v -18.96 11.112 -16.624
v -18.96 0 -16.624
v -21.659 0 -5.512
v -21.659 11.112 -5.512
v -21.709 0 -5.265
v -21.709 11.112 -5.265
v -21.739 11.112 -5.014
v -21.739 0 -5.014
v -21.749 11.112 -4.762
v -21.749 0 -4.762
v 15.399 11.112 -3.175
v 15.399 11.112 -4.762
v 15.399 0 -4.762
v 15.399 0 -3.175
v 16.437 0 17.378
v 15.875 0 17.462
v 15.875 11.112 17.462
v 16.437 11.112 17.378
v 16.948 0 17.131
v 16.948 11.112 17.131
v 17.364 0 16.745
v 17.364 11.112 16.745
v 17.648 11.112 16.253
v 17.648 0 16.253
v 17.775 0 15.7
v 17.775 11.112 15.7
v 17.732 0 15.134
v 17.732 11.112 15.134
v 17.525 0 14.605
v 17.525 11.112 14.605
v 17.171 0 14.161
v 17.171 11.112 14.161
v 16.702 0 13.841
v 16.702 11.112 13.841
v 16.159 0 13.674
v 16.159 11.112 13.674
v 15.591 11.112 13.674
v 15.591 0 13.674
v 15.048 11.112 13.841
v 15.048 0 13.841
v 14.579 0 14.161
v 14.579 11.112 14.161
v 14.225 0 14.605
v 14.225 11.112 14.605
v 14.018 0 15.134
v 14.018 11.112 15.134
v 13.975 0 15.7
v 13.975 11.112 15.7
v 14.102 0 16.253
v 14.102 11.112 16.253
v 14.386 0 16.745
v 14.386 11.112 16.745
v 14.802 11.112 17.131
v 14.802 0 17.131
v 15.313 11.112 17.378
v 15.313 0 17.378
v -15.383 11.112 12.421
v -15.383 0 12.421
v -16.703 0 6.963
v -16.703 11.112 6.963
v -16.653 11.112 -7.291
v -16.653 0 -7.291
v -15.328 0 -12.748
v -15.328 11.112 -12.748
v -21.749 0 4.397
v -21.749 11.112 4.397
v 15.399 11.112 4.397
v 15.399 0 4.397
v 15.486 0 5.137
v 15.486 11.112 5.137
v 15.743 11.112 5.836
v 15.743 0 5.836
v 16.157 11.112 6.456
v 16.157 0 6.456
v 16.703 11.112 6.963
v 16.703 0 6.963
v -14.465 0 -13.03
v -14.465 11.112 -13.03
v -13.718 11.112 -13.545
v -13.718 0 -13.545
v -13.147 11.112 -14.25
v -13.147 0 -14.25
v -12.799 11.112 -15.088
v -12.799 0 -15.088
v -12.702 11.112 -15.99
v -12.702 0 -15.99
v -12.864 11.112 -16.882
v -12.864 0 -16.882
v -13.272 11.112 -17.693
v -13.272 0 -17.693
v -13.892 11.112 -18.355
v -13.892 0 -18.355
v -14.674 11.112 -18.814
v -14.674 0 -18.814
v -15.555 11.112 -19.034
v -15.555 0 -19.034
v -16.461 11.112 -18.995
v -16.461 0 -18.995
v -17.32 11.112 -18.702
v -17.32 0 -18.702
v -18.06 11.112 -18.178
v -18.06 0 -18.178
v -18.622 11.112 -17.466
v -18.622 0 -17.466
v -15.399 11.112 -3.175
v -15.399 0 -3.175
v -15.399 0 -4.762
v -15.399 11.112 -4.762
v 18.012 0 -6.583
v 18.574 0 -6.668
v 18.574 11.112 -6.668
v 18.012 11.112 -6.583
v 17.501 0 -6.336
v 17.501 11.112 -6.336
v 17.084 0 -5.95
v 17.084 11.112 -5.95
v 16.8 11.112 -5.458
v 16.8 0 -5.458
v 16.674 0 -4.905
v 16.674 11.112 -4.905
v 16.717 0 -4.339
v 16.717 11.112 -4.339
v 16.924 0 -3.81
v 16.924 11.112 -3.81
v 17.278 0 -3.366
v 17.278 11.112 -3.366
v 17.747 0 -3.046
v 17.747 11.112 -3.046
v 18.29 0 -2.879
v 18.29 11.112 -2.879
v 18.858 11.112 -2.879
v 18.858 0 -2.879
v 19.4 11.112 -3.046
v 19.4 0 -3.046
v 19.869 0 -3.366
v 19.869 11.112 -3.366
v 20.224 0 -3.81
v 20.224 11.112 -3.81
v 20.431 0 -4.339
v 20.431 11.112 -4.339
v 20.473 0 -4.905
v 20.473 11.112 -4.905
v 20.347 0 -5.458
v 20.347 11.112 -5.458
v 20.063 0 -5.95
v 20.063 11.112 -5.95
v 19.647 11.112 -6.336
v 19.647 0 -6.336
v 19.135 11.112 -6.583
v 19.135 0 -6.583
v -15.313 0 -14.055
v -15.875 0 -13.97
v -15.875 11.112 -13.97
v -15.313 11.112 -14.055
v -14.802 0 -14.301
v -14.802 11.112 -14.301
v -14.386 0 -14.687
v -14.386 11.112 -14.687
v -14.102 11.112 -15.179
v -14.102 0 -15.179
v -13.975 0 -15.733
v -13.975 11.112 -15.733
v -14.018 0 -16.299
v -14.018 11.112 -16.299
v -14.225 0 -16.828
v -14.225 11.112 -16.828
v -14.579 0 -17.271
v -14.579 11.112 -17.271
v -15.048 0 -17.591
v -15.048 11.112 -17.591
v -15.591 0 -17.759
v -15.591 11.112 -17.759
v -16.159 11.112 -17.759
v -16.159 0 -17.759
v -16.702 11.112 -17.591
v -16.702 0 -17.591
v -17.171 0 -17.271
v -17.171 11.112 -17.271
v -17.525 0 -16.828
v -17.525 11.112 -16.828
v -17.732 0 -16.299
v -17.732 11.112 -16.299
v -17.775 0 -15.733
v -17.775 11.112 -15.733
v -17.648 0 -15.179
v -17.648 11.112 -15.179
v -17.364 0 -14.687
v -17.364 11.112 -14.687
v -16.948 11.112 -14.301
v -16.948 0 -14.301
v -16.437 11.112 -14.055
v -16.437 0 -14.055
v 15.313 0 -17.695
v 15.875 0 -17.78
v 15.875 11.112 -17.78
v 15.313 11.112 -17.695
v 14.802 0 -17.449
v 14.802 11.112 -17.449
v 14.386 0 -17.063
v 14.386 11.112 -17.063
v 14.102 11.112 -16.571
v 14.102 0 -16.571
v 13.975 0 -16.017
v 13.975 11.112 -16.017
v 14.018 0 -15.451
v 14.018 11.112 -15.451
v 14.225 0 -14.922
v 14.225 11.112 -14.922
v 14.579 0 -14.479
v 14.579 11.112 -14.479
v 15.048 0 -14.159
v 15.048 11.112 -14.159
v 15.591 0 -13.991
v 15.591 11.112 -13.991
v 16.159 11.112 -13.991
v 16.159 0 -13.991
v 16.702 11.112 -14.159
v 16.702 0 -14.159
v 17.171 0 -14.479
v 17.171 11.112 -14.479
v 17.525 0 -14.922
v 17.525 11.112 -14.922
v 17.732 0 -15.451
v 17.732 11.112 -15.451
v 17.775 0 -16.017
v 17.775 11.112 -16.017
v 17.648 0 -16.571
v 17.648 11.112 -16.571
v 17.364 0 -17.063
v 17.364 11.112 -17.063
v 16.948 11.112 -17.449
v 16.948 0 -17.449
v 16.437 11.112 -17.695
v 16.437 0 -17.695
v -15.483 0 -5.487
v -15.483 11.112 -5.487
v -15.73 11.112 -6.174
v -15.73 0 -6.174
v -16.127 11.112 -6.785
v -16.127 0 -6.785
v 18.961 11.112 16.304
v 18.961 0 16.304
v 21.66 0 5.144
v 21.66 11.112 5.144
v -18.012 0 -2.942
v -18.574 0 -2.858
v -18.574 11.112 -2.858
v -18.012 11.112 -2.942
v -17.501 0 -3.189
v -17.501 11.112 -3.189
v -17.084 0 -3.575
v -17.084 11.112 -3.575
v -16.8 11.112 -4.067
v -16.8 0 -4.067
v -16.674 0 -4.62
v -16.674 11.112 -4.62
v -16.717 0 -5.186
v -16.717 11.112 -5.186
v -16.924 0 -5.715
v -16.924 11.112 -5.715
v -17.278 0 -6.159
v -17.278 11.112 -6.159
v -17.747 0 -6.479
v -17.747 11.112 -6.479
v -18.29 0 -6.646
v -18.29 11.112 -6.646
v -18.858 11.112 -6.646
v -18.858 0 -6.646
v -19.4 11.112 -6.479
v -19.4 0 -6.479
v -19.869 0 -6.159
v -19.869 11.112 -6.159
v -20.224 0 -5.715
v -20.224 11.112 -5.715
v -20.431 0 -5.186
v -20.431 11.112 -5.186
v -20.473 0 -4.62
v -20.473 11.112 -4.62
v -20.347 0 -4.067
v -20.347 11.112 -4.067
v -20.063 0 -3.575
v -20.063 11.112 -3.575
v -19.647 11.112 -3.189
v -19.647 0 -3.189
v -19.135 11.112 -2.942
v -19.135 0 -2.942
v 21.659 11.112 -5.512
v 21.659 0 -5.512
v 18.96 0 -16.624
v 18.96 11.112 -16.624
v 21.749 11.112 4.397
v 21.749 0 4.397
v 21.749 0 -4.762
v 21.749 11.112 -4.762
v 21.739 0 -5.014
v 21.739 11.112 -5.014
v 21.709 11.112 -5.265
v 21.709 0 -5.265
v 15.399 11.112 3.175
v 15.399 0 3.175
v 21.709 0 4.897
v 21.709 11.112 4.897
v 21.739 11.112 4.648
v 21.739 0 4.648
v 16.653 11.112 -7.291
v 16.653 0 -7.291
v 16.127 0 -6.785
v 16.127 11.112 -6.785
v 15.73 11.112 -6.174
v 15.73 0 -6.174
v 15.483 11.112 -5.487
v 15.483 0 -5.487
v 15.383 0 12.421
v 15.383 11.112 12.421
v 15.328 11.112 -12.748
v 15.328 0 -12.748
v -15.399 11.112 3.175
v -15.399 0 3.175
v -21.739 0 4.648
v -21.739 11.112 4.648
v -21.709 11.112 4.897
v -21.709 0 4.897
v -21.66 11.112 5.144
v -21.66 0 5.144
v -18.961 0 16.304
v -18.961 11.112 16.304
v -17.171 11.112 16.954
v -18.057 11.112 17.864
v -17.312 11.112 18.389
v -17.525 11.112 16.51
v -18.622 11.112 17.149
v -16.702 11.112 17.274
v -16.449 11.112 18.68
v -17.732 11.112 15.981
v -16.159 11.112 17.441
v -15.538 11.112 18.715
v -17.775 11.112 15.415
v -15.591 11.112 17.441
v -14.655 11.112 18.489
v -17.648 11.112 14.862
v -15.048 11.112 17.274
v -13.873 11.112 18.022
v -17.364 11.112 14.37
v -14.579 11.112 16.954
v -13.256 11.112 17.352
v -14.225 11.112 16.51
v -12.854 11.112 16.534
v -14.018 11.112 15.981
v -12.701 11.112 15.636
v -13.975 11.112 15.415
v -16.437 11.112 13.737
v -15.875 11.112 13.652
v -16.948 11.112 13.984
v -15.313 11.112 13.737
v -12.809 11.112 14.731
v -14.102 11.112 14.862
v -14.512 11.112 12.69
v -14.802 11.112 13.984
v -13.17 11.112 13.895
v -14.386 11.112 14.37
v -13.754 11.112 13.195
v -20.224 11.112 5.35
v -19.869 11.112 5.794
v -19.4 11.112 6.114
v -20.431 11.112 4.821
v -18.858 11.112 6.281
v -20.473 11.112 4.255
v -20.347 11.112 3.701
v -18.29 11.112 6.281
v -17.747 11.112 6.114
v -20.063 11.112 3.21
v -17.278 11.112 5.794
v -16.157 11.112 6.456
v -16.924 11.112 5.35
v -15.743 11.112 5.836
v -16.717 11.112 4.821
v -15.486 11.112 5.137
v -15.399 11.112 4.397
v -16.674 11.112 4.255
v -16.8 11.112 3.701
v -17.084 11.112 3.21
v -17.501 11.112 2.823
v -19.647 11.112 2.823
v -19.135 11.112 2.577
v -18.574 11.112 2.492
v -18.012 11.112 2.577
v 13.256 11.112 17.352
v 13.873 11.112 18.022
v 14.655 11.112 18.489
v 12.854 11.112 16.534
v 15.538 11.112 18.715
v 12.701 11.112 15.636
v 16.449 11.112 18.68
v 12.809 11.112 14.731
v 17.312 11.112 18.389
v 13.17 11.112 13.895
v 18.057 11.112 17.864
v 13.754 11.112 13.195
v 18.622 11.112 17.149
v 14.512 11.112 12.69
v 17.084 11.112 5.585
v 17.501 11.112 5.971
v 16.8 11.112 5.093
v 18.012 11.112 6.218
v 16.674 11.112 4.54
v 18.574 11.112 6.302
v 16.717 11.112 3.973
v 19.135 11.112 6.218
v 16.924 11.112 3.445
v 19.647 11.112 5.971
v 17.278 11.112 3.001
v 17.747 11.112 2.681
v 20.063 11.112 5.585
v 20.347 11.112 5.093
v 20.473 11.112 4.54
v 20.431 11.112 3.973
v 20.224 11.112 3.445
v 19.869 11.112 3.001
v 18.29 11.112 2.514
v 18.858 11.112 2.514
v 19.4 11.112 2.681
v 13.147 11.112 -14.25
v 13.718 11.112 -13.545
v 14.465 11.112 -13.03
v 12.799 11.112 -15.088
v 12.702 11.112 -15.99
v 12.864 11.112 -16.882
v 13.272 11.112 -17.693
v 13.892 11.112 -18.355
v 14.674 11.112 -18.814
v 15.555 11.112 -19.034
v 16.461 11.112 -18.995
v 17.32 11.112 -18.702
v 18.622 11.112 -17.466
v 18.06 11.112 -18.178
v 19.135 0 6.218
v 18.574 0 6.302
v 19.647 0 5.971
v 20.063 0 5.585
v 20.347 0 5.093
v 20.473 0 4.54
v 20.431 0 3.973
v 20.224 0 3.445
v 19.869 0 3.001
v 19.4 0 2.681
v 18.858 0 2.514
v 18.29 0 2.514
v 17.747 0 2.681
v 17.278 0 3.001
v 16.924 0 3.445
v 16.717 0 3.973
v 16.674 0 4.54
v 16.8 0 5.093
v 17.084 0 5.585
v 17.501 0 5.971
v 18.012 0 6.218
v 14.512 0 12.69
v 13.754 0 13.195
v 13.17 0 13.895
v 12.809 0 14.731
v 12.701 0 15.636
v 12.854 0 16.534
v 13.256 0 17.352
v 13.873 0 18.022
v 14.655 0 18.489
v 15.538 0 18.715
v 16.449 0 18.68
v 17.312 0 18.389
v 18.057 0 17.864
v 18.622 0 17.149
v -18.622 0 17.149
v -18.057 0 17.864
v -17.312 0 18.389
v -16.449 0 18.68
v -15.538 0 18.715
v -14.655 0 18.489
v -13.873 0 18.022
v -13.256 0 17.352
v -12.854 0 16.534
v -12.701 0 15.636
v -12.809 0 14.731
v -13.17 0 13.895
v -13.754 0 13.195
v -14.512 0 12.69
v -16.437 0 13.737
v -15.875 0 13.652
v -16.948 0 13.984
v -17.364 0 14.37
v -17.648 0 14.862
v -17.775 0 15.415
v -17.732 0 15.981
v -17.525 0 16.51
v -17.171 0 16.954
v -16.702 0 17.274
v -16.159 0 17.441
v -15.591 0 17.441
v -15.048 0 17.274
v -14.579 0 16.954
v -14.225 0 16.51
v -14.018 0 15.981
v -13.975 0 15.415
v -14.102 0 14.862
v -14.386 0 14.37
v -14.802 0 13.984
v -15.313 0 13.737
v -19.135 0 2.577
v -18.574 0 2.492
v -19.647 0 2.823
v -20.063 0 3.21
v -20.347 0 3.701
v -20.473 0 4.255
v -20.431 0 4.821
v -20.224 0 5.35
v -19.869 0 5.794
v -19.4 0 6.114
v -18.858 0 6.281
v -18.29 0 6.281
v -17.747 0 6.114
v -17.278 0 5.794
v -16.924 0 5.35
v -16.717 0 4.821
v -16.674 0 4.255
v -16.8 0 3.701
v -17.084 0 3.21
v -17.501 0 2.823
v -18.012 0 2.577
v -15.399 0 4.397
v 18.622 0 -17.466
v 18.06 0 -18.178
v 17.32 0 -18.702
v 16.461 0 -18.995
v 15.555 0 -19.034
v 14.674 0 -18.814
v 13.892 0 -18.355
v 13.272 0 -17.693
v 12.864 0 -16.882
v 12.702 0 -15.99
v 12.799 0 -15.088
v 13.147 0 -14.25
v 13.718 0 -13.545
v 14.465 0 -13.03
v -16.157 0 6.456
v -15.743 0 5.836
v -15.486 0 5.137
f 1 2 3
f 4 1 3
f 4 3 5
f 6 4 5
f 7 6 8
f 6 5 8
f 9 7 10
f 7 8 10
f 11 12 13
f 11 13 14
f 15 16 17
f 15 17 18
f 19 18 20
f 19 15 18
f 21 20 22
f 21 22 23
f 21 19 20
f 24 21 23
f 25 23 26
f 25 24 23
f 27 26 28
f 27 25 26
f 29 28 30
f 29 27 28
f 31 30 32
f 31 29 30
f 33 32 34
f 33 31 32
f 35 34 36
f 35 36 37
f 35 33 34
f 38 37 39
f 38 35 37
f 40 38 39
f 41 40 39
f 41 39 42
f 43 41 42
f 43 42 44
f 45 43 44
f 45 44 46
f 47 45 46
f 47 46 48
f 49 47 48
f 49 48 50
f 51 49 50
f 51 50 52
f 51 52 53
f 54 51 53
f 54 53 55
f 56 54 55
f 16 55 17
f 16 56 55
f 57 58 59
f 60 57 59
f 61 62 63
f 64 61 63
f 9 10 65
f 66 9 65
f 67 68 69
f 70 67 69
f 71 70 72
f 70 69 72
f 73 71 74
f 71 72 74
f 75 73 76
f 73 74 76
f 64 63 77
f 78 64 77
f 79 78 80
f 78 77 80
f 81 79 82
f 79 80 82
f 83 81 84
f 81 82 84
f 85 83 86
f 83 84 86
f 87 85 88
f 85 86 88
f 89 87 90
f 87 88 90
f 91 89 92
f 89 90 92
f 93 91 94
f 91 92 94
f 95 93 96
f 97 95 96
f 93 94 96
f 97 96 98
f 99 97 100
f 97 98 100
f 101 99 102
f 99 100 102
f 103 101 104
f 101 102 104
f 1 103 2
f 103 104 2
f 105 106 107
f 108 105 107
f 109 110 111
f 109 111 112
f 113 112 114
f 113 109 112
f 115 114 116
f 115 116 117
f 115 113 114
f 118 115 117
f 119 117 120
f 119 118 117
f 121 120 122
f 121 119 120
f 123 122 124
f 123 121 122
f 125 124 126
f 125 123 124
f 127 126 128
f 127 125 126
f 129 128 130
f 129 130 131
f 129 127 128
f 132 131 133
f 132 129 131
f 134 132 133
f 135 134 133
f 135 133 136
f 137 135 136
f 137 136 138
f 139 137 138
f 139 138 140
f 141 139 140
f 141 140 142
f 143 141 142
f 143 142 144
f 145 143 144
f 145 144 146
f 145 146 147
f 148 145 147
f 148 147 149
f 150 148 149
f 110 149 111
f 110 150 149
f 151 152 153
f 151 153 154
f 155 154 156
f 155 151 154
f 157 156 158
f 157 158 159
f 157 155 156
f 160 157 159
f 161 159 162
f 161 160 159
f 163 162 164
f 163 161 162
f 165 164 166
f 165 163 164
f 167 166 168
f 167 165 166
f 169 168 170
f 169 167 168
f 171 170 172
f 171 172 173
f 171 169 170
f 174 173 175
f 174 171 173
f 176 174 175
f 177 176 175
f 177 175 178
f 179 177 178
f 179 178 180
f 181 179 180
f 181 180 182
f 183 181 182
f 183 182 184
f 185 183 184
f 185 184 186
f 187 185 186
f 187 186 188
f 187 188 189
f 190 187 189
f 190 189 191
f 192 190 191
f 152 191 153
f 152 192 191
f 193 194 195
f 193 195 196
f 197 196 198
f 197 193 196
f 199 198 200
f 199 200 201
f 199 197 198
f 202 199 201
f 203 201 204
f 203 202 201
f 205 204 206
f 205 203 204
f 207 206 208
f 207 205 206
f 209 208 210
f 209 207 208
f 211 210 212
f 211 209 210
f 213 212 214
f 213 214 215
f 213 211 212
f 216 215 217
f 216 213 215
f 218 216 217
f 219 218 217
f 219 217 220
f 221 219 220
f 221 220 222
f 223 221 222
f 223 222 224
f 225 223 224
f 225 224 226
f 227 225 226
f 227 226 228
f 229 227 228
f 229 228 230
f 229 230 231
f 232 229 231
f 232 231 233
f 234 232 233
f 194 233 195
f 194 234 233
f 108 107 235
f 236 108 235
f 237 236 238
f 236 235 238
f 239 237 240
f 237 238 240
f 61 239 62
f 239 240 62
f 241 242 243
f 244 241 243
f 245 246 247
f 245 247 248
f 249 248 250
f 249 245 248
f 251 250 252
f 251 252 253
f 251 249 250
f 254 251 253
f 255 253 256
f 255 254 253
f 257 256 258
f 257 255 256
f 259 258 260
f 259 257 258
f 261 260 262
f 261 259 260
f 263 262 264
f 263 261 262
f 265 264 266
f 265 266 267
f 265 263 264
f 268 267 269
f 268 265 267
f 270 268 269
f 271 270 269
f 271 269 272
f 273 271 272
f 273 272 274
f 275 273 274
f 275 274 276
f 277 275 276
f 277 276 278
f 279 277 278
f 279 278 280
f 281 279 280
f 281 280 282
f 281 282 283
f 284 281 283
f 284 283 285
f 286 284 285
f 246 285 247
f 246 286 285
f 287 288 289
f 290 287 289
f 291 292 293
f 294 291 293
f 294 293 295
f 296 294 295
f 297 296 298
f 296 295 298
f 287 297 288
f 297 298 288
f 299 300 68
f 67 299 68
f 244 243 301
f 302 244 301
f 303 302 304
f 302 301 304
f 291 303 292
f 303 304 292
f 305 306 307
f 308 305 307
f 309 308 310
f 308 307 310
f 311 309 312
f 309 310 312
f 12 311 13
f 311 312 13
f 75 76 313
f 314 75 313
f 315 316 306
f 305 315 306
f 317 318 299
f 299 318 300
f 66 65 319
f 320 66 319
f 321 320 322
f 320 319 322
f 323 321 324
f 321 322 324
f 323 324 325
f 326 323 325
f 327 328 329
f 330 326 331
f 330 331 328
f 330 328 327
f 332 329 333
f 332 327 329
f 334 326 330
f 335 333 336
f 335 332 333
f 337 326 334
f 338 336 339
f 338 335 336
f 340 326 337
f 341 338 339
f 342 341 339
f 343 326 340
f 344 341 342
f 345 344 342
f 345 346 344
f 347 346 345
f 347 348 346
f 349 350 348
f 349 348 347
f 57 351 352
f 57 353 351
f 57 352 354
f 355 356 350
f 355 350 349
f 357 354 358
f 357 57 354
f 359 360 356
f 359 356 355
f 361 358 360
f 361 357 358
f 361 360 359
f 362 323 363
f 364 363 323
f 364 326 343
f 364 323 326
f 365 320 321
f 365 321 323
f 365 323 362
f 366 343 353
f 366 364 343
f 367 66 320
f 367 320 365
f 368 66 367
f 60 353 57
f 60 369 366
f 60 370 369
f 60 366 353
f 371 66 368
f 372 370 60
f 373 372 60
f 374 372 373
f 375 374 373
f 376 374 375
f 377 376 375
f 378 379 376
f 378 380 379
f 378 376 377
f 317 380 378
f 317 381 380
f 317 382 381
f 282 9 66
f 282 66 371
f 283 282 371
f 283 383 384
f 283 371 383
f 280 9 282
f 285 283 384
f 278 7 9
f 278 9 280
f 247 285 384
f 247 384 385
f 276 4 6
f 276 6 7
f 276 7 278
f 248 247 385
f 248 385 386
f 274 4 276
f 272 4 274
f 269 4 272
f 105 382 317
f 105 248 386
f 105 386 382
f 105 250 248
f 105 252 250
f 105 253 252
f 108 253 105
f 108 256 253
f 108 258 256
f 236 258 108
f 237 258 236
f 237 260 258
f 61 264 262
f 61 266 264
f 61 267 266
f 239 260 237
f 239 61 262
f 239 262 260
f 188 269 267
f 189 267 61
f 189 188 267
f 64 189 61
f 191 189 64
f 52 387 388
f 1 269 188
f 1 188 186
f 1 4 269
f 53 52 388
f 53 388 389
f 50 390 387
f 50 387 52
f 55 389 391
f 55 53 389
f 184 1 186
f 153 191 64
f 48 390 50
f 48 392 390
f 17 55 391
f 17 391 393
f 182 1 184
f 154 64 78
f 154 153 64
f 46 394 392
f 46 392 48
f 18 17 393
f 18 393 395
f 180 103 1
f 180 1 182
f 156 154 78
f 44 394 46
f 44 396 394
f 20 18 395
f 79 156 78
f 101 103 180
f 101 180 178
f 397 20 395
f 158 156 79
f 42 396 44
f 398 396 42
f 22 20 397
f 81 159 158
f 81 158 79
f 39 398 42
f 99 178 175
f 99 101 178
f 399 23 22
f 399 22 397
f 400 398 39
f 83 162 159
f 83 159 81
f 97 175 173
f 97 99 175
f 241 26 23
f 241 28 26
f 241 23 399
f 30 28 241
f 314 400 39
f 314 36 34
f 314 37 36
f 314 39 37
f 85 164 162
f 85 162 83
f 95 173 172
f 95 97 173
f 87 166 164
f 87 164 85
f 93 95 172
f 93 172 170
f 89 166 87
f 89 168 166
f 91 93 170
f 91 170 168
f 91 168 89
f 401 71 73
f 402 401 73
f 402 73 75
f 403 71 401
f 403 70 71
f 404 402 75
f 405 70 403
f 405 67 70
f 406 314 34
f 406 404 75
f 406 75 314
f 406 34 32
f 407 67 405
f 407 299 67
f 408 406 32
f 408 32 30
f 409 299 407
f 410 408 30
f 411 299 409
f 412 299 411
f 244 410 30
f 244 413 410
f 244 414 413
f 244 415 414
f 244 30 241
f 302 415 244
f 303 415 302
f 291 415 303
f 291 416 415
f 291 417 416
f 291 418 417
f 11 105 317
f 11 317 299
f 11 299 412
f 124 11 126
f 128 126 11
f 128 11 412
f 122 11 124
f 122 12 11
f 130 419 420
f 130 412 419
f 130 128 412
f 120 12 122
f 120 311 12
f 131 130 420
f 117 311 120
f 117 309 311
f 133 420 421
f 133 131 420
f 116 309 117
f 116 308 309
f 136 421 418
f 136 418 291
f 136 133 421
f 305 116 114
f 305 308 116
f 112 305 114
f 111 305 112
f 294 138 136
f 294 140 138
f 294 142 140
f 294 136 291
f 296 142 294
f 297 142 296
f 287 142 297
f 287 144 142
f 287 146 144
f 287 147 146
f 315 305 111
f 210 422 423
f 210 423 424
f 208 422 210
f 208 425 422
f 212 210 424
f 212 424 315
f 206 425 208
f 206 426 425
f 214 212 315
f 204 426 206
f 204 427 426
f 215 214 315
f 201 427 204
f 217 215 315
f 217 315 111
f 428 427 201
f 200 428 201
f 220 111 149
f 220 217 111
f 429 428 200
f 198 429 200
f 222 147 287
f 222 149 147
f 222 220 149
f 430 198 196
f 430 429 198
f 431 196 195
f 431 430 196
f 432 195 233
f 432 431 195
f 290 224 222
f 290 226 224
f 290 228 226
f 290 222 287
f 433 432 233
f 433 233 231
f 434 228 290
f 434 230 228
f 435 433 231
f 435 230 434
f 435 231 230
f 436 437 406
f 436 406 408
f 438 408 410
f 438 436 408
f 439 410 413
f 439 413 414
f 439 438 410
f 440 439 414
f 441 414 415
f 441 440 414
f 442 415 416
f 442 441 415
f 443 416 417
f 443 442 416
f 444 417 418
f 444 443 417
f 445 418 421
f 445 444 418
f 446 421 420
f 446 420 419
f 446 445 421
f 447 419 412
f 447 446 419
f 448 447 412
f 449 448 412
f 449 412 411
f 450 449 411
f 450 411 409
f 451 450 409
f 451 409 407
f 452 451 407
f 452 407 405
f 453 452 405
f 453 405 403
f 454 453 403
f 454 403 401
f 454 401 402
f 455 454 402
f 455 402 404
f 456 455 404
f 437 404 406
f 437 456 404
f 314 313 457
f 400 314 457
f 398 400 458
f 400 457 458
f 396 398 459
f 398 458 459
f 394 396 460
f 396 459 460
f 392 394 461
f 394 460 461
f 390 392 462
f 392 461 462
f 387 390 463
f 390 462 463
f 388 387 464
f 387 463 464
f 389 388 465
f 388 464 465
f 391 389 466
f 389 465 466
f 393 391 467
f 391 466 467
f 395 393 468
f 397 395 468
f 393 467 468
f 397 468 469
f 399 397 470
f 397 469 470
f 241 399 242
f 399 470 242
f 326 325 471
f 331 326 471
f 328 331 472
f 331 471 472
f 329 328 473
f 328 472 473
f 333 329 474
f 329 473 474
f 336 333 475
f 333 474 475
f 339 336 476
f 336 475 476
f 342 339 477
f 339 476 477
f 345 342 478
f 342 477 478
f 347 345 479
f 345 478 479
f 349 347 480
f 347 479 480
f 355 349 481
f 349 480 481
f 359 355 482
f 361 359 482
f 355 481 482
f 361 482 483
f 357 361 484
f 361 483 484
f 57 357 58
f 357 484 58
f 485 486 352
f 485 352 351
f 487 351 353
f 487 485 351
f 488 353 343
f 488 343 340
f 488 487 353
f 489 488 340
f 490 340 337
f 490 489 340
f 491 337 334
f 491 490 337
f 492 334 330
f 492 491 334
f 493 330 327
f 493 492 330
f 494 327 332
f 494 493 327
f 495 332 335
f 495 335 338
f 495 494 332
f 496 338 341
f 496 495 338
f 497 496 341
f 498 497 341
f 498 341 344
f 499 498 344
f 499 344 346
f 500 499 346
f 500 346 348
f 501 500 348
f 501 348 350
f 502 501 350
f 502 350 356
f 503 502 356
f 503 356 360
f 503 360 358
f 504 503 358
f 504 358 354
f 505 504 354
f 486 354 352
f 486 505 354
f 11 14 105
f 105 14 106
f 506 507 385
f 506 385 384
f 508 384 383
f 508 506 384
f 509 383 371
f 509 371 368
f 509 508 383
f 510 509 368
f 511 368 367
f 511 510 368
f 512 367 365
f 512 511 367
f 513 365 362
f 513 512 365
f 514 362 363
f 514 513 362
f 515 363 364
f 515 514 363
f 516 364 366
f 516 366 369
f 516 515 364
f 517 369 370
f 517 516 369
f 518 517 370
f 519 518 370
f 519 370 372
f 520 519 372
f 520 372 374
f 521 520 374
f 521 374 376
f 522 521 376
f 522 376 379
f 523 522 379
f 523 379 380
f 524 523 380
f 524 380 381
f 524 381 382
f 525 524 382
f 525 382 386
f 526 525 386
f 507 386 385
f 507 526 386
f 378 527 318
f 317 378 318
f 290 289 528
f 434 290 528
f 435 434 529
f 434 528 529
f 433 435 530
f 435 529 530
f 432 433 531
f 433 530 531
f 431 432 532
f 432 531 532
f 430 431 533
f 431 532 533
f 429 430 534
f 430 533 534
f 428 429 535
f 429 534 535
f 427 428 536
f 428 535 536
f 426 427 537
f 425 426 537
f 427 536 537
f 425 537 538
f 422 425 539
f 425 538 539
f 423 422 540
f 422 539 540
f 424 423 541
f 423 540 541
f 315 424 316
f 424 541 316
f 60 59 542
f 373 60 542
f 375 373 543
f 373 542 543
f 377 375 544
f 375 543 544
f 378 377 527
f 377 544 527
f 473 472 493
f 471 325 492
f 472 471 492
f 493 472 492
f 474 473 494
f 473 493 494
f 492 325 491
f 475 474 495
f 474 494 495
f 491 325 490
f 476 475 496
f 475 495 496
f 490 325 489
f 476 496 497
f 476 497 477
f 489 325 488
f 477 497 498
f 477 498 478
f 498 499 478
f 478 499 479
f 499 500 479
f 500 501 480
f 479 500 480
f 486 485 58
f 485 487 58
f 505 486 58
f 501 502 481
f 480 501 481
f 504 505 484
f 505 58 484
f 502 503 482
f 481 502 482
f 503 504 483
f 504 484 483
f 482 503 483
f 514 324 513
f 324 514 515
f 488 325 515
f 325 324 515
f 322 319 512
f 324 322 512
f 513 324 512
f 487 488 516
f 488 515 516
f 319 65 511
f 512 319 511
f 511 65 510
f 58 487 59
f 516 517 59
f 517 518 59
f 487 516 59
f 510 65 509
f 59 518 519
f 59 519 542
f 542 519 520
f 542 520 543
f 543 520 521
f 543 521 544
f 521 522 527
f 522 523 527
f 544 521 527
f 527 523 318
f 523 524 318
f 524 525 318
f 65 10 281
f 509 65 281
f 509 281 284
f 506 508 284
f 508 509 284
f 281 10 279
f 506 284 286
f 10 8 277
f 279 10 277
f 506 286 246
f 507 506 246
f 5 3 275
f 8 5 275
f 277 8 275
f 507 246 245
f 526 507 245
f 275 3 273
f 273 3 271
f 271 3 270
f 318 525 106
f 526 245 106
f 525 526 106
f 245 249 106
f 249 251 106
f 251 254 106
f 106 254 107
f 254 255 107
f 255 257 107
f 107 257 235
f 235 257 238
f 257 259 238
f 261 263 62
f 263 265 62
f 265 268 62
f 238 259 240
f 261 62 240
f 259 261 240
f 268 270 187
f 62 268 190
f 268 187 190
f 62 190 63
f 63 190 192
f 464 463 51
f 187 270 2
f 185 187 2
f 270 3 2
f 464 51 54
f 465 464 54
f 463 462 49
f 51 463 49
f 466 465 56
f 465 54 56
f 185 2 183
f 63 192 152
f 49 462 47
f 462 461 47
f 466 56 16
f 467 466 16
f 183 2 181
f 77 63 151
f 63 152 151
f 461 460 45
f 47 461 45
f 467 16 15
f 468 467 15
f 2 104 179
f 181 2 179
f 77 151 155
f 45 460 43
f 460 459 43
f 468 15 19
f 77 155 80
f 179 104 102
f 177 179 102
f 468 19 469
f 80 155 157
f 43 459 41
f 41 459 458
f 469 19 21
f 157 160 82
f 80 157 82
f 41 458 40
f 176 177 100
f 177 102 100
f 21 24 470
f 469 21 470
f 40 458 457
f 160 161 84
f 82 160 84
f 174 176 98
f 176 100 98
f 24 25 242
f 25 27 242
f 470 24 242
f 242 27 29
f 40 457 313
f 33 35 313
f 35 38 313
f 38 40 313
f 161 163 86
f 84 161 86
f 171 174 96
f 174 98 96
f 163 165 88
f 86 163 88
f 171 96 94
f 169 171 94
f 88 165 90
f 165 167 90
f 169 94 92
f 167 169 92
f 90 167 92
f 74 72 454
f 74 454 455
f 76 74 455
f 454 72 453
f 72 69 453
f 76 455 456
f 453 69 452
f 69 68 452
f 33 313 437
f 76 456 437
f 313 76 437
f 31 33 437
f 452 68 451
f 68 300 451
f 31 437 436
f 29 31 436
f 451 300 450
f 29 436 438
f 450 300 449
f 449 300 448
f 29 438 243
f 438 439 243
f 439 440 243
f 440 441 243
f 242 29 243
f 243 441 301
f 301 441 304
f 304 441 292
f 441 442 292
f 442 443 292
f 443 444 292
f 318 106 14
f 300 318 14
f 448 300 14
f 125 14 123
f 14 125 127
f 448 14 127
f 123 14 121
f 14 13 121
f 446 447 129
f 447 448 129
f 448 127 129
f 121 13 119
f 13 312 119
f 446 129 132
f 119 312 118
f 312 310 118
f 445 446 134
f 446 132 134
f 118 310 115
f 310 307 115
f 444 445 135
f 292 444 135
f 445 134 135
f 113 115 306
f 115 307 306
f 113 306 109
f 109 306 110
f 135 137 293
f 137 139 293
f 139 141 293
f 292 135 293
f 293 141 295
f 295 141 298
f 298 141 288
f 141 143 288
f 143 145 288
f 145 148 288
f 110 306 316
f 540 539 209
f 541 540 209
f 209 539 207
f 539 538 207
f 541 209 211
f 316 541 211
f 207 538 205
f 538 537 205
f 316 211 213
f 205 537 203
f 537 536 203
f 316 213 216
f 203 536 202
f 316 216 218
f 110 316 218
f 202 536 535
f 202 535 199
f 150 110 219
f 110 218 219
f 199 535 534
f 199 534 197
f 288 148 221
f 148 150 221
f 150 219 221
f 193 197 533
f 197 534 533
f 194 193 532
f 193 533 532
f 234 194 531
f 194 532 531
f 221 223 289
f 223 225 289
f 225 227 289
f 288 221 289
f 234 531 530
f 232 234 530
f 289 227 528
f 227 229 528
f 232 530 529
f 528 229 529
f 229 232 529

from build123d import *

# Parameters (mm, degrees)
SKETCH2_R           = 1.905
BOSS_EXTRUDE1_DEPTH = 11.1125


with BuildPart() as part:
    # Sketch2 → Boss-Extrude1 (new body)
    with BuildSketch(Plane(origin=(0, 0, 0), x_dir=(1, 0, 0), z_dir=(0, 1, 0))):
        with BuildLine():
            Line((-16.652885777, 7.290524058), (-15.327609815, 12.747542729))
            ThreePointArc((-15.327609815, 12.747542729), (-13.558199469, 18.045958382), (-18.96031801, 16.624291517))
            Line((-18.96031801, 16.624291517), (-21.65906801, 5.511791517))
            ThreePointArc((-21.65906801, 5.511791517), (-21.726249777, 5.139819704), (-21.74875, 4.7625))
            Line((-21.74875, 4.7625), (-21.74875, -4.397375))
            ThreePointArc((-21.74875, -4.397375), (-21.726434075, -4.773151689), (-21.659800003, -5.143645982))
            Line((-21.659800003, -5.143645982), (-18.961050003, -16.303770982))
            ThreePointArc((-18.961050003, -16.303770982), (-13.540192666, -17.709080747), (-15.382866617, -12.420872873))
            Line((-15.382866617, -12.420872873), (-16.702800144, -6.962559523))
            ThreePointArc((-16.702800144, -6.962559523), (-15.743476975, -5.836186872), (-15.39875, -4.397375))
            Line((-15.39875, -4.397375), (-15.39875, -3.175))
            Line((-15.39875, -3.175), (15.39875, -3.175))
            Line((15.39875, -3.175), (15.39875, -4.397375))
            ThreePointArc((15.39875, -4.397375), (15.743476975, -5.836186872), (16.702800144, -6.962559523))
            Line((16.702800144, -6.962559523), (15.382866617, -12.420872873))
            ThreePointArc((15.382866617, -12.420872873), (13.540192666, -17.709080747), (18.961050003, -16.303770982))
            Line((18.961050003, -16.303770982), (21.659800003, -5.143645982))
            ThreePointArc((21.659800003, -5.143645982), (21.726434075, -4.773151689), (21.74875, -4.397375))
            Line((21.74875, -4.397375), (21.74875, 4.7625))
            ThreePointArc((21.74875, 4.7625), (21.726249777, 5.139819704), (21.65906801, 5.511791517))
            Line((21.65906801, 5.511791517), (18.96031801, 16.624291517))
            ThreePointArc((18.96031801, 16.624291517), (13.558199469, 18.045958382), (15.327609815, 12.747542729))
            Line((15.327609815, 12.747542729), (16.652885777, 7.290524058))
            ThreePointArc((16.652885777, 7.290524058), (15.72951294, 6.173506926), (15.39875, 4.7625))
            Line((15.39875, 4.7625), (15.39875, 3.175))
            Line((15.39875, 3.175), (-15.39875, 3.175))
            Line((-15.39875, 3.175), (-15.39875, 4.7625))
            ThreePointArc((-15.39875, 4.7625), (-15.72951294, 6.173506926), (-16.652885777, 7.290524058))
        make_face()
        with Locations(Location((-15.875, 15.875, 0), (0, 0, 270))):
            Circle(SKETCH2_R, mode=Mode.SUBTRACT)
        with Locations(Location((-18.57375, 4.7625, 0), (0, 0, 270))):
            Circle(SKETCH2_R, mode=Mode.SUBTRACT)
        with Locations(Location((-18.57375, -4.397375, 0), (0, 0, 90))):
            Circle(SKETCH2_R, mode=Mode.SUBTRACT)
        with Locations(Location((-15.875, -15.5575, 0), (0, 0, 90))):
            Circle(SKETCH2_R, mode=Mode.SUBTRACT)
        with Locations(Location((15.875, -15.5575, 0), (0, 0, 270))):
            Circle(SKETCH2_R, mode=Mode.SUBTRACT)
        with Locations(Location((18.57375, -4.397375, 0), (0, 0, 270))):
            Circle(SKETCH2_R, mode=Mode.SUBTRACT)
        with Locations(Location((18.57375, 4.7625, 0), (0, 0, 90))):
            Circle(SKETCH2_R, mode=Mode.SUBTRACT)
        with Locations(Location((15.875, 15.875, 0), (0, 0, 90))):
            Circle(SKETCH2_R, mode=Mode.SUBTRACT)
    extrude(amount=BOSS_EXTRUDE1_DEPTH)


solid = part.part
